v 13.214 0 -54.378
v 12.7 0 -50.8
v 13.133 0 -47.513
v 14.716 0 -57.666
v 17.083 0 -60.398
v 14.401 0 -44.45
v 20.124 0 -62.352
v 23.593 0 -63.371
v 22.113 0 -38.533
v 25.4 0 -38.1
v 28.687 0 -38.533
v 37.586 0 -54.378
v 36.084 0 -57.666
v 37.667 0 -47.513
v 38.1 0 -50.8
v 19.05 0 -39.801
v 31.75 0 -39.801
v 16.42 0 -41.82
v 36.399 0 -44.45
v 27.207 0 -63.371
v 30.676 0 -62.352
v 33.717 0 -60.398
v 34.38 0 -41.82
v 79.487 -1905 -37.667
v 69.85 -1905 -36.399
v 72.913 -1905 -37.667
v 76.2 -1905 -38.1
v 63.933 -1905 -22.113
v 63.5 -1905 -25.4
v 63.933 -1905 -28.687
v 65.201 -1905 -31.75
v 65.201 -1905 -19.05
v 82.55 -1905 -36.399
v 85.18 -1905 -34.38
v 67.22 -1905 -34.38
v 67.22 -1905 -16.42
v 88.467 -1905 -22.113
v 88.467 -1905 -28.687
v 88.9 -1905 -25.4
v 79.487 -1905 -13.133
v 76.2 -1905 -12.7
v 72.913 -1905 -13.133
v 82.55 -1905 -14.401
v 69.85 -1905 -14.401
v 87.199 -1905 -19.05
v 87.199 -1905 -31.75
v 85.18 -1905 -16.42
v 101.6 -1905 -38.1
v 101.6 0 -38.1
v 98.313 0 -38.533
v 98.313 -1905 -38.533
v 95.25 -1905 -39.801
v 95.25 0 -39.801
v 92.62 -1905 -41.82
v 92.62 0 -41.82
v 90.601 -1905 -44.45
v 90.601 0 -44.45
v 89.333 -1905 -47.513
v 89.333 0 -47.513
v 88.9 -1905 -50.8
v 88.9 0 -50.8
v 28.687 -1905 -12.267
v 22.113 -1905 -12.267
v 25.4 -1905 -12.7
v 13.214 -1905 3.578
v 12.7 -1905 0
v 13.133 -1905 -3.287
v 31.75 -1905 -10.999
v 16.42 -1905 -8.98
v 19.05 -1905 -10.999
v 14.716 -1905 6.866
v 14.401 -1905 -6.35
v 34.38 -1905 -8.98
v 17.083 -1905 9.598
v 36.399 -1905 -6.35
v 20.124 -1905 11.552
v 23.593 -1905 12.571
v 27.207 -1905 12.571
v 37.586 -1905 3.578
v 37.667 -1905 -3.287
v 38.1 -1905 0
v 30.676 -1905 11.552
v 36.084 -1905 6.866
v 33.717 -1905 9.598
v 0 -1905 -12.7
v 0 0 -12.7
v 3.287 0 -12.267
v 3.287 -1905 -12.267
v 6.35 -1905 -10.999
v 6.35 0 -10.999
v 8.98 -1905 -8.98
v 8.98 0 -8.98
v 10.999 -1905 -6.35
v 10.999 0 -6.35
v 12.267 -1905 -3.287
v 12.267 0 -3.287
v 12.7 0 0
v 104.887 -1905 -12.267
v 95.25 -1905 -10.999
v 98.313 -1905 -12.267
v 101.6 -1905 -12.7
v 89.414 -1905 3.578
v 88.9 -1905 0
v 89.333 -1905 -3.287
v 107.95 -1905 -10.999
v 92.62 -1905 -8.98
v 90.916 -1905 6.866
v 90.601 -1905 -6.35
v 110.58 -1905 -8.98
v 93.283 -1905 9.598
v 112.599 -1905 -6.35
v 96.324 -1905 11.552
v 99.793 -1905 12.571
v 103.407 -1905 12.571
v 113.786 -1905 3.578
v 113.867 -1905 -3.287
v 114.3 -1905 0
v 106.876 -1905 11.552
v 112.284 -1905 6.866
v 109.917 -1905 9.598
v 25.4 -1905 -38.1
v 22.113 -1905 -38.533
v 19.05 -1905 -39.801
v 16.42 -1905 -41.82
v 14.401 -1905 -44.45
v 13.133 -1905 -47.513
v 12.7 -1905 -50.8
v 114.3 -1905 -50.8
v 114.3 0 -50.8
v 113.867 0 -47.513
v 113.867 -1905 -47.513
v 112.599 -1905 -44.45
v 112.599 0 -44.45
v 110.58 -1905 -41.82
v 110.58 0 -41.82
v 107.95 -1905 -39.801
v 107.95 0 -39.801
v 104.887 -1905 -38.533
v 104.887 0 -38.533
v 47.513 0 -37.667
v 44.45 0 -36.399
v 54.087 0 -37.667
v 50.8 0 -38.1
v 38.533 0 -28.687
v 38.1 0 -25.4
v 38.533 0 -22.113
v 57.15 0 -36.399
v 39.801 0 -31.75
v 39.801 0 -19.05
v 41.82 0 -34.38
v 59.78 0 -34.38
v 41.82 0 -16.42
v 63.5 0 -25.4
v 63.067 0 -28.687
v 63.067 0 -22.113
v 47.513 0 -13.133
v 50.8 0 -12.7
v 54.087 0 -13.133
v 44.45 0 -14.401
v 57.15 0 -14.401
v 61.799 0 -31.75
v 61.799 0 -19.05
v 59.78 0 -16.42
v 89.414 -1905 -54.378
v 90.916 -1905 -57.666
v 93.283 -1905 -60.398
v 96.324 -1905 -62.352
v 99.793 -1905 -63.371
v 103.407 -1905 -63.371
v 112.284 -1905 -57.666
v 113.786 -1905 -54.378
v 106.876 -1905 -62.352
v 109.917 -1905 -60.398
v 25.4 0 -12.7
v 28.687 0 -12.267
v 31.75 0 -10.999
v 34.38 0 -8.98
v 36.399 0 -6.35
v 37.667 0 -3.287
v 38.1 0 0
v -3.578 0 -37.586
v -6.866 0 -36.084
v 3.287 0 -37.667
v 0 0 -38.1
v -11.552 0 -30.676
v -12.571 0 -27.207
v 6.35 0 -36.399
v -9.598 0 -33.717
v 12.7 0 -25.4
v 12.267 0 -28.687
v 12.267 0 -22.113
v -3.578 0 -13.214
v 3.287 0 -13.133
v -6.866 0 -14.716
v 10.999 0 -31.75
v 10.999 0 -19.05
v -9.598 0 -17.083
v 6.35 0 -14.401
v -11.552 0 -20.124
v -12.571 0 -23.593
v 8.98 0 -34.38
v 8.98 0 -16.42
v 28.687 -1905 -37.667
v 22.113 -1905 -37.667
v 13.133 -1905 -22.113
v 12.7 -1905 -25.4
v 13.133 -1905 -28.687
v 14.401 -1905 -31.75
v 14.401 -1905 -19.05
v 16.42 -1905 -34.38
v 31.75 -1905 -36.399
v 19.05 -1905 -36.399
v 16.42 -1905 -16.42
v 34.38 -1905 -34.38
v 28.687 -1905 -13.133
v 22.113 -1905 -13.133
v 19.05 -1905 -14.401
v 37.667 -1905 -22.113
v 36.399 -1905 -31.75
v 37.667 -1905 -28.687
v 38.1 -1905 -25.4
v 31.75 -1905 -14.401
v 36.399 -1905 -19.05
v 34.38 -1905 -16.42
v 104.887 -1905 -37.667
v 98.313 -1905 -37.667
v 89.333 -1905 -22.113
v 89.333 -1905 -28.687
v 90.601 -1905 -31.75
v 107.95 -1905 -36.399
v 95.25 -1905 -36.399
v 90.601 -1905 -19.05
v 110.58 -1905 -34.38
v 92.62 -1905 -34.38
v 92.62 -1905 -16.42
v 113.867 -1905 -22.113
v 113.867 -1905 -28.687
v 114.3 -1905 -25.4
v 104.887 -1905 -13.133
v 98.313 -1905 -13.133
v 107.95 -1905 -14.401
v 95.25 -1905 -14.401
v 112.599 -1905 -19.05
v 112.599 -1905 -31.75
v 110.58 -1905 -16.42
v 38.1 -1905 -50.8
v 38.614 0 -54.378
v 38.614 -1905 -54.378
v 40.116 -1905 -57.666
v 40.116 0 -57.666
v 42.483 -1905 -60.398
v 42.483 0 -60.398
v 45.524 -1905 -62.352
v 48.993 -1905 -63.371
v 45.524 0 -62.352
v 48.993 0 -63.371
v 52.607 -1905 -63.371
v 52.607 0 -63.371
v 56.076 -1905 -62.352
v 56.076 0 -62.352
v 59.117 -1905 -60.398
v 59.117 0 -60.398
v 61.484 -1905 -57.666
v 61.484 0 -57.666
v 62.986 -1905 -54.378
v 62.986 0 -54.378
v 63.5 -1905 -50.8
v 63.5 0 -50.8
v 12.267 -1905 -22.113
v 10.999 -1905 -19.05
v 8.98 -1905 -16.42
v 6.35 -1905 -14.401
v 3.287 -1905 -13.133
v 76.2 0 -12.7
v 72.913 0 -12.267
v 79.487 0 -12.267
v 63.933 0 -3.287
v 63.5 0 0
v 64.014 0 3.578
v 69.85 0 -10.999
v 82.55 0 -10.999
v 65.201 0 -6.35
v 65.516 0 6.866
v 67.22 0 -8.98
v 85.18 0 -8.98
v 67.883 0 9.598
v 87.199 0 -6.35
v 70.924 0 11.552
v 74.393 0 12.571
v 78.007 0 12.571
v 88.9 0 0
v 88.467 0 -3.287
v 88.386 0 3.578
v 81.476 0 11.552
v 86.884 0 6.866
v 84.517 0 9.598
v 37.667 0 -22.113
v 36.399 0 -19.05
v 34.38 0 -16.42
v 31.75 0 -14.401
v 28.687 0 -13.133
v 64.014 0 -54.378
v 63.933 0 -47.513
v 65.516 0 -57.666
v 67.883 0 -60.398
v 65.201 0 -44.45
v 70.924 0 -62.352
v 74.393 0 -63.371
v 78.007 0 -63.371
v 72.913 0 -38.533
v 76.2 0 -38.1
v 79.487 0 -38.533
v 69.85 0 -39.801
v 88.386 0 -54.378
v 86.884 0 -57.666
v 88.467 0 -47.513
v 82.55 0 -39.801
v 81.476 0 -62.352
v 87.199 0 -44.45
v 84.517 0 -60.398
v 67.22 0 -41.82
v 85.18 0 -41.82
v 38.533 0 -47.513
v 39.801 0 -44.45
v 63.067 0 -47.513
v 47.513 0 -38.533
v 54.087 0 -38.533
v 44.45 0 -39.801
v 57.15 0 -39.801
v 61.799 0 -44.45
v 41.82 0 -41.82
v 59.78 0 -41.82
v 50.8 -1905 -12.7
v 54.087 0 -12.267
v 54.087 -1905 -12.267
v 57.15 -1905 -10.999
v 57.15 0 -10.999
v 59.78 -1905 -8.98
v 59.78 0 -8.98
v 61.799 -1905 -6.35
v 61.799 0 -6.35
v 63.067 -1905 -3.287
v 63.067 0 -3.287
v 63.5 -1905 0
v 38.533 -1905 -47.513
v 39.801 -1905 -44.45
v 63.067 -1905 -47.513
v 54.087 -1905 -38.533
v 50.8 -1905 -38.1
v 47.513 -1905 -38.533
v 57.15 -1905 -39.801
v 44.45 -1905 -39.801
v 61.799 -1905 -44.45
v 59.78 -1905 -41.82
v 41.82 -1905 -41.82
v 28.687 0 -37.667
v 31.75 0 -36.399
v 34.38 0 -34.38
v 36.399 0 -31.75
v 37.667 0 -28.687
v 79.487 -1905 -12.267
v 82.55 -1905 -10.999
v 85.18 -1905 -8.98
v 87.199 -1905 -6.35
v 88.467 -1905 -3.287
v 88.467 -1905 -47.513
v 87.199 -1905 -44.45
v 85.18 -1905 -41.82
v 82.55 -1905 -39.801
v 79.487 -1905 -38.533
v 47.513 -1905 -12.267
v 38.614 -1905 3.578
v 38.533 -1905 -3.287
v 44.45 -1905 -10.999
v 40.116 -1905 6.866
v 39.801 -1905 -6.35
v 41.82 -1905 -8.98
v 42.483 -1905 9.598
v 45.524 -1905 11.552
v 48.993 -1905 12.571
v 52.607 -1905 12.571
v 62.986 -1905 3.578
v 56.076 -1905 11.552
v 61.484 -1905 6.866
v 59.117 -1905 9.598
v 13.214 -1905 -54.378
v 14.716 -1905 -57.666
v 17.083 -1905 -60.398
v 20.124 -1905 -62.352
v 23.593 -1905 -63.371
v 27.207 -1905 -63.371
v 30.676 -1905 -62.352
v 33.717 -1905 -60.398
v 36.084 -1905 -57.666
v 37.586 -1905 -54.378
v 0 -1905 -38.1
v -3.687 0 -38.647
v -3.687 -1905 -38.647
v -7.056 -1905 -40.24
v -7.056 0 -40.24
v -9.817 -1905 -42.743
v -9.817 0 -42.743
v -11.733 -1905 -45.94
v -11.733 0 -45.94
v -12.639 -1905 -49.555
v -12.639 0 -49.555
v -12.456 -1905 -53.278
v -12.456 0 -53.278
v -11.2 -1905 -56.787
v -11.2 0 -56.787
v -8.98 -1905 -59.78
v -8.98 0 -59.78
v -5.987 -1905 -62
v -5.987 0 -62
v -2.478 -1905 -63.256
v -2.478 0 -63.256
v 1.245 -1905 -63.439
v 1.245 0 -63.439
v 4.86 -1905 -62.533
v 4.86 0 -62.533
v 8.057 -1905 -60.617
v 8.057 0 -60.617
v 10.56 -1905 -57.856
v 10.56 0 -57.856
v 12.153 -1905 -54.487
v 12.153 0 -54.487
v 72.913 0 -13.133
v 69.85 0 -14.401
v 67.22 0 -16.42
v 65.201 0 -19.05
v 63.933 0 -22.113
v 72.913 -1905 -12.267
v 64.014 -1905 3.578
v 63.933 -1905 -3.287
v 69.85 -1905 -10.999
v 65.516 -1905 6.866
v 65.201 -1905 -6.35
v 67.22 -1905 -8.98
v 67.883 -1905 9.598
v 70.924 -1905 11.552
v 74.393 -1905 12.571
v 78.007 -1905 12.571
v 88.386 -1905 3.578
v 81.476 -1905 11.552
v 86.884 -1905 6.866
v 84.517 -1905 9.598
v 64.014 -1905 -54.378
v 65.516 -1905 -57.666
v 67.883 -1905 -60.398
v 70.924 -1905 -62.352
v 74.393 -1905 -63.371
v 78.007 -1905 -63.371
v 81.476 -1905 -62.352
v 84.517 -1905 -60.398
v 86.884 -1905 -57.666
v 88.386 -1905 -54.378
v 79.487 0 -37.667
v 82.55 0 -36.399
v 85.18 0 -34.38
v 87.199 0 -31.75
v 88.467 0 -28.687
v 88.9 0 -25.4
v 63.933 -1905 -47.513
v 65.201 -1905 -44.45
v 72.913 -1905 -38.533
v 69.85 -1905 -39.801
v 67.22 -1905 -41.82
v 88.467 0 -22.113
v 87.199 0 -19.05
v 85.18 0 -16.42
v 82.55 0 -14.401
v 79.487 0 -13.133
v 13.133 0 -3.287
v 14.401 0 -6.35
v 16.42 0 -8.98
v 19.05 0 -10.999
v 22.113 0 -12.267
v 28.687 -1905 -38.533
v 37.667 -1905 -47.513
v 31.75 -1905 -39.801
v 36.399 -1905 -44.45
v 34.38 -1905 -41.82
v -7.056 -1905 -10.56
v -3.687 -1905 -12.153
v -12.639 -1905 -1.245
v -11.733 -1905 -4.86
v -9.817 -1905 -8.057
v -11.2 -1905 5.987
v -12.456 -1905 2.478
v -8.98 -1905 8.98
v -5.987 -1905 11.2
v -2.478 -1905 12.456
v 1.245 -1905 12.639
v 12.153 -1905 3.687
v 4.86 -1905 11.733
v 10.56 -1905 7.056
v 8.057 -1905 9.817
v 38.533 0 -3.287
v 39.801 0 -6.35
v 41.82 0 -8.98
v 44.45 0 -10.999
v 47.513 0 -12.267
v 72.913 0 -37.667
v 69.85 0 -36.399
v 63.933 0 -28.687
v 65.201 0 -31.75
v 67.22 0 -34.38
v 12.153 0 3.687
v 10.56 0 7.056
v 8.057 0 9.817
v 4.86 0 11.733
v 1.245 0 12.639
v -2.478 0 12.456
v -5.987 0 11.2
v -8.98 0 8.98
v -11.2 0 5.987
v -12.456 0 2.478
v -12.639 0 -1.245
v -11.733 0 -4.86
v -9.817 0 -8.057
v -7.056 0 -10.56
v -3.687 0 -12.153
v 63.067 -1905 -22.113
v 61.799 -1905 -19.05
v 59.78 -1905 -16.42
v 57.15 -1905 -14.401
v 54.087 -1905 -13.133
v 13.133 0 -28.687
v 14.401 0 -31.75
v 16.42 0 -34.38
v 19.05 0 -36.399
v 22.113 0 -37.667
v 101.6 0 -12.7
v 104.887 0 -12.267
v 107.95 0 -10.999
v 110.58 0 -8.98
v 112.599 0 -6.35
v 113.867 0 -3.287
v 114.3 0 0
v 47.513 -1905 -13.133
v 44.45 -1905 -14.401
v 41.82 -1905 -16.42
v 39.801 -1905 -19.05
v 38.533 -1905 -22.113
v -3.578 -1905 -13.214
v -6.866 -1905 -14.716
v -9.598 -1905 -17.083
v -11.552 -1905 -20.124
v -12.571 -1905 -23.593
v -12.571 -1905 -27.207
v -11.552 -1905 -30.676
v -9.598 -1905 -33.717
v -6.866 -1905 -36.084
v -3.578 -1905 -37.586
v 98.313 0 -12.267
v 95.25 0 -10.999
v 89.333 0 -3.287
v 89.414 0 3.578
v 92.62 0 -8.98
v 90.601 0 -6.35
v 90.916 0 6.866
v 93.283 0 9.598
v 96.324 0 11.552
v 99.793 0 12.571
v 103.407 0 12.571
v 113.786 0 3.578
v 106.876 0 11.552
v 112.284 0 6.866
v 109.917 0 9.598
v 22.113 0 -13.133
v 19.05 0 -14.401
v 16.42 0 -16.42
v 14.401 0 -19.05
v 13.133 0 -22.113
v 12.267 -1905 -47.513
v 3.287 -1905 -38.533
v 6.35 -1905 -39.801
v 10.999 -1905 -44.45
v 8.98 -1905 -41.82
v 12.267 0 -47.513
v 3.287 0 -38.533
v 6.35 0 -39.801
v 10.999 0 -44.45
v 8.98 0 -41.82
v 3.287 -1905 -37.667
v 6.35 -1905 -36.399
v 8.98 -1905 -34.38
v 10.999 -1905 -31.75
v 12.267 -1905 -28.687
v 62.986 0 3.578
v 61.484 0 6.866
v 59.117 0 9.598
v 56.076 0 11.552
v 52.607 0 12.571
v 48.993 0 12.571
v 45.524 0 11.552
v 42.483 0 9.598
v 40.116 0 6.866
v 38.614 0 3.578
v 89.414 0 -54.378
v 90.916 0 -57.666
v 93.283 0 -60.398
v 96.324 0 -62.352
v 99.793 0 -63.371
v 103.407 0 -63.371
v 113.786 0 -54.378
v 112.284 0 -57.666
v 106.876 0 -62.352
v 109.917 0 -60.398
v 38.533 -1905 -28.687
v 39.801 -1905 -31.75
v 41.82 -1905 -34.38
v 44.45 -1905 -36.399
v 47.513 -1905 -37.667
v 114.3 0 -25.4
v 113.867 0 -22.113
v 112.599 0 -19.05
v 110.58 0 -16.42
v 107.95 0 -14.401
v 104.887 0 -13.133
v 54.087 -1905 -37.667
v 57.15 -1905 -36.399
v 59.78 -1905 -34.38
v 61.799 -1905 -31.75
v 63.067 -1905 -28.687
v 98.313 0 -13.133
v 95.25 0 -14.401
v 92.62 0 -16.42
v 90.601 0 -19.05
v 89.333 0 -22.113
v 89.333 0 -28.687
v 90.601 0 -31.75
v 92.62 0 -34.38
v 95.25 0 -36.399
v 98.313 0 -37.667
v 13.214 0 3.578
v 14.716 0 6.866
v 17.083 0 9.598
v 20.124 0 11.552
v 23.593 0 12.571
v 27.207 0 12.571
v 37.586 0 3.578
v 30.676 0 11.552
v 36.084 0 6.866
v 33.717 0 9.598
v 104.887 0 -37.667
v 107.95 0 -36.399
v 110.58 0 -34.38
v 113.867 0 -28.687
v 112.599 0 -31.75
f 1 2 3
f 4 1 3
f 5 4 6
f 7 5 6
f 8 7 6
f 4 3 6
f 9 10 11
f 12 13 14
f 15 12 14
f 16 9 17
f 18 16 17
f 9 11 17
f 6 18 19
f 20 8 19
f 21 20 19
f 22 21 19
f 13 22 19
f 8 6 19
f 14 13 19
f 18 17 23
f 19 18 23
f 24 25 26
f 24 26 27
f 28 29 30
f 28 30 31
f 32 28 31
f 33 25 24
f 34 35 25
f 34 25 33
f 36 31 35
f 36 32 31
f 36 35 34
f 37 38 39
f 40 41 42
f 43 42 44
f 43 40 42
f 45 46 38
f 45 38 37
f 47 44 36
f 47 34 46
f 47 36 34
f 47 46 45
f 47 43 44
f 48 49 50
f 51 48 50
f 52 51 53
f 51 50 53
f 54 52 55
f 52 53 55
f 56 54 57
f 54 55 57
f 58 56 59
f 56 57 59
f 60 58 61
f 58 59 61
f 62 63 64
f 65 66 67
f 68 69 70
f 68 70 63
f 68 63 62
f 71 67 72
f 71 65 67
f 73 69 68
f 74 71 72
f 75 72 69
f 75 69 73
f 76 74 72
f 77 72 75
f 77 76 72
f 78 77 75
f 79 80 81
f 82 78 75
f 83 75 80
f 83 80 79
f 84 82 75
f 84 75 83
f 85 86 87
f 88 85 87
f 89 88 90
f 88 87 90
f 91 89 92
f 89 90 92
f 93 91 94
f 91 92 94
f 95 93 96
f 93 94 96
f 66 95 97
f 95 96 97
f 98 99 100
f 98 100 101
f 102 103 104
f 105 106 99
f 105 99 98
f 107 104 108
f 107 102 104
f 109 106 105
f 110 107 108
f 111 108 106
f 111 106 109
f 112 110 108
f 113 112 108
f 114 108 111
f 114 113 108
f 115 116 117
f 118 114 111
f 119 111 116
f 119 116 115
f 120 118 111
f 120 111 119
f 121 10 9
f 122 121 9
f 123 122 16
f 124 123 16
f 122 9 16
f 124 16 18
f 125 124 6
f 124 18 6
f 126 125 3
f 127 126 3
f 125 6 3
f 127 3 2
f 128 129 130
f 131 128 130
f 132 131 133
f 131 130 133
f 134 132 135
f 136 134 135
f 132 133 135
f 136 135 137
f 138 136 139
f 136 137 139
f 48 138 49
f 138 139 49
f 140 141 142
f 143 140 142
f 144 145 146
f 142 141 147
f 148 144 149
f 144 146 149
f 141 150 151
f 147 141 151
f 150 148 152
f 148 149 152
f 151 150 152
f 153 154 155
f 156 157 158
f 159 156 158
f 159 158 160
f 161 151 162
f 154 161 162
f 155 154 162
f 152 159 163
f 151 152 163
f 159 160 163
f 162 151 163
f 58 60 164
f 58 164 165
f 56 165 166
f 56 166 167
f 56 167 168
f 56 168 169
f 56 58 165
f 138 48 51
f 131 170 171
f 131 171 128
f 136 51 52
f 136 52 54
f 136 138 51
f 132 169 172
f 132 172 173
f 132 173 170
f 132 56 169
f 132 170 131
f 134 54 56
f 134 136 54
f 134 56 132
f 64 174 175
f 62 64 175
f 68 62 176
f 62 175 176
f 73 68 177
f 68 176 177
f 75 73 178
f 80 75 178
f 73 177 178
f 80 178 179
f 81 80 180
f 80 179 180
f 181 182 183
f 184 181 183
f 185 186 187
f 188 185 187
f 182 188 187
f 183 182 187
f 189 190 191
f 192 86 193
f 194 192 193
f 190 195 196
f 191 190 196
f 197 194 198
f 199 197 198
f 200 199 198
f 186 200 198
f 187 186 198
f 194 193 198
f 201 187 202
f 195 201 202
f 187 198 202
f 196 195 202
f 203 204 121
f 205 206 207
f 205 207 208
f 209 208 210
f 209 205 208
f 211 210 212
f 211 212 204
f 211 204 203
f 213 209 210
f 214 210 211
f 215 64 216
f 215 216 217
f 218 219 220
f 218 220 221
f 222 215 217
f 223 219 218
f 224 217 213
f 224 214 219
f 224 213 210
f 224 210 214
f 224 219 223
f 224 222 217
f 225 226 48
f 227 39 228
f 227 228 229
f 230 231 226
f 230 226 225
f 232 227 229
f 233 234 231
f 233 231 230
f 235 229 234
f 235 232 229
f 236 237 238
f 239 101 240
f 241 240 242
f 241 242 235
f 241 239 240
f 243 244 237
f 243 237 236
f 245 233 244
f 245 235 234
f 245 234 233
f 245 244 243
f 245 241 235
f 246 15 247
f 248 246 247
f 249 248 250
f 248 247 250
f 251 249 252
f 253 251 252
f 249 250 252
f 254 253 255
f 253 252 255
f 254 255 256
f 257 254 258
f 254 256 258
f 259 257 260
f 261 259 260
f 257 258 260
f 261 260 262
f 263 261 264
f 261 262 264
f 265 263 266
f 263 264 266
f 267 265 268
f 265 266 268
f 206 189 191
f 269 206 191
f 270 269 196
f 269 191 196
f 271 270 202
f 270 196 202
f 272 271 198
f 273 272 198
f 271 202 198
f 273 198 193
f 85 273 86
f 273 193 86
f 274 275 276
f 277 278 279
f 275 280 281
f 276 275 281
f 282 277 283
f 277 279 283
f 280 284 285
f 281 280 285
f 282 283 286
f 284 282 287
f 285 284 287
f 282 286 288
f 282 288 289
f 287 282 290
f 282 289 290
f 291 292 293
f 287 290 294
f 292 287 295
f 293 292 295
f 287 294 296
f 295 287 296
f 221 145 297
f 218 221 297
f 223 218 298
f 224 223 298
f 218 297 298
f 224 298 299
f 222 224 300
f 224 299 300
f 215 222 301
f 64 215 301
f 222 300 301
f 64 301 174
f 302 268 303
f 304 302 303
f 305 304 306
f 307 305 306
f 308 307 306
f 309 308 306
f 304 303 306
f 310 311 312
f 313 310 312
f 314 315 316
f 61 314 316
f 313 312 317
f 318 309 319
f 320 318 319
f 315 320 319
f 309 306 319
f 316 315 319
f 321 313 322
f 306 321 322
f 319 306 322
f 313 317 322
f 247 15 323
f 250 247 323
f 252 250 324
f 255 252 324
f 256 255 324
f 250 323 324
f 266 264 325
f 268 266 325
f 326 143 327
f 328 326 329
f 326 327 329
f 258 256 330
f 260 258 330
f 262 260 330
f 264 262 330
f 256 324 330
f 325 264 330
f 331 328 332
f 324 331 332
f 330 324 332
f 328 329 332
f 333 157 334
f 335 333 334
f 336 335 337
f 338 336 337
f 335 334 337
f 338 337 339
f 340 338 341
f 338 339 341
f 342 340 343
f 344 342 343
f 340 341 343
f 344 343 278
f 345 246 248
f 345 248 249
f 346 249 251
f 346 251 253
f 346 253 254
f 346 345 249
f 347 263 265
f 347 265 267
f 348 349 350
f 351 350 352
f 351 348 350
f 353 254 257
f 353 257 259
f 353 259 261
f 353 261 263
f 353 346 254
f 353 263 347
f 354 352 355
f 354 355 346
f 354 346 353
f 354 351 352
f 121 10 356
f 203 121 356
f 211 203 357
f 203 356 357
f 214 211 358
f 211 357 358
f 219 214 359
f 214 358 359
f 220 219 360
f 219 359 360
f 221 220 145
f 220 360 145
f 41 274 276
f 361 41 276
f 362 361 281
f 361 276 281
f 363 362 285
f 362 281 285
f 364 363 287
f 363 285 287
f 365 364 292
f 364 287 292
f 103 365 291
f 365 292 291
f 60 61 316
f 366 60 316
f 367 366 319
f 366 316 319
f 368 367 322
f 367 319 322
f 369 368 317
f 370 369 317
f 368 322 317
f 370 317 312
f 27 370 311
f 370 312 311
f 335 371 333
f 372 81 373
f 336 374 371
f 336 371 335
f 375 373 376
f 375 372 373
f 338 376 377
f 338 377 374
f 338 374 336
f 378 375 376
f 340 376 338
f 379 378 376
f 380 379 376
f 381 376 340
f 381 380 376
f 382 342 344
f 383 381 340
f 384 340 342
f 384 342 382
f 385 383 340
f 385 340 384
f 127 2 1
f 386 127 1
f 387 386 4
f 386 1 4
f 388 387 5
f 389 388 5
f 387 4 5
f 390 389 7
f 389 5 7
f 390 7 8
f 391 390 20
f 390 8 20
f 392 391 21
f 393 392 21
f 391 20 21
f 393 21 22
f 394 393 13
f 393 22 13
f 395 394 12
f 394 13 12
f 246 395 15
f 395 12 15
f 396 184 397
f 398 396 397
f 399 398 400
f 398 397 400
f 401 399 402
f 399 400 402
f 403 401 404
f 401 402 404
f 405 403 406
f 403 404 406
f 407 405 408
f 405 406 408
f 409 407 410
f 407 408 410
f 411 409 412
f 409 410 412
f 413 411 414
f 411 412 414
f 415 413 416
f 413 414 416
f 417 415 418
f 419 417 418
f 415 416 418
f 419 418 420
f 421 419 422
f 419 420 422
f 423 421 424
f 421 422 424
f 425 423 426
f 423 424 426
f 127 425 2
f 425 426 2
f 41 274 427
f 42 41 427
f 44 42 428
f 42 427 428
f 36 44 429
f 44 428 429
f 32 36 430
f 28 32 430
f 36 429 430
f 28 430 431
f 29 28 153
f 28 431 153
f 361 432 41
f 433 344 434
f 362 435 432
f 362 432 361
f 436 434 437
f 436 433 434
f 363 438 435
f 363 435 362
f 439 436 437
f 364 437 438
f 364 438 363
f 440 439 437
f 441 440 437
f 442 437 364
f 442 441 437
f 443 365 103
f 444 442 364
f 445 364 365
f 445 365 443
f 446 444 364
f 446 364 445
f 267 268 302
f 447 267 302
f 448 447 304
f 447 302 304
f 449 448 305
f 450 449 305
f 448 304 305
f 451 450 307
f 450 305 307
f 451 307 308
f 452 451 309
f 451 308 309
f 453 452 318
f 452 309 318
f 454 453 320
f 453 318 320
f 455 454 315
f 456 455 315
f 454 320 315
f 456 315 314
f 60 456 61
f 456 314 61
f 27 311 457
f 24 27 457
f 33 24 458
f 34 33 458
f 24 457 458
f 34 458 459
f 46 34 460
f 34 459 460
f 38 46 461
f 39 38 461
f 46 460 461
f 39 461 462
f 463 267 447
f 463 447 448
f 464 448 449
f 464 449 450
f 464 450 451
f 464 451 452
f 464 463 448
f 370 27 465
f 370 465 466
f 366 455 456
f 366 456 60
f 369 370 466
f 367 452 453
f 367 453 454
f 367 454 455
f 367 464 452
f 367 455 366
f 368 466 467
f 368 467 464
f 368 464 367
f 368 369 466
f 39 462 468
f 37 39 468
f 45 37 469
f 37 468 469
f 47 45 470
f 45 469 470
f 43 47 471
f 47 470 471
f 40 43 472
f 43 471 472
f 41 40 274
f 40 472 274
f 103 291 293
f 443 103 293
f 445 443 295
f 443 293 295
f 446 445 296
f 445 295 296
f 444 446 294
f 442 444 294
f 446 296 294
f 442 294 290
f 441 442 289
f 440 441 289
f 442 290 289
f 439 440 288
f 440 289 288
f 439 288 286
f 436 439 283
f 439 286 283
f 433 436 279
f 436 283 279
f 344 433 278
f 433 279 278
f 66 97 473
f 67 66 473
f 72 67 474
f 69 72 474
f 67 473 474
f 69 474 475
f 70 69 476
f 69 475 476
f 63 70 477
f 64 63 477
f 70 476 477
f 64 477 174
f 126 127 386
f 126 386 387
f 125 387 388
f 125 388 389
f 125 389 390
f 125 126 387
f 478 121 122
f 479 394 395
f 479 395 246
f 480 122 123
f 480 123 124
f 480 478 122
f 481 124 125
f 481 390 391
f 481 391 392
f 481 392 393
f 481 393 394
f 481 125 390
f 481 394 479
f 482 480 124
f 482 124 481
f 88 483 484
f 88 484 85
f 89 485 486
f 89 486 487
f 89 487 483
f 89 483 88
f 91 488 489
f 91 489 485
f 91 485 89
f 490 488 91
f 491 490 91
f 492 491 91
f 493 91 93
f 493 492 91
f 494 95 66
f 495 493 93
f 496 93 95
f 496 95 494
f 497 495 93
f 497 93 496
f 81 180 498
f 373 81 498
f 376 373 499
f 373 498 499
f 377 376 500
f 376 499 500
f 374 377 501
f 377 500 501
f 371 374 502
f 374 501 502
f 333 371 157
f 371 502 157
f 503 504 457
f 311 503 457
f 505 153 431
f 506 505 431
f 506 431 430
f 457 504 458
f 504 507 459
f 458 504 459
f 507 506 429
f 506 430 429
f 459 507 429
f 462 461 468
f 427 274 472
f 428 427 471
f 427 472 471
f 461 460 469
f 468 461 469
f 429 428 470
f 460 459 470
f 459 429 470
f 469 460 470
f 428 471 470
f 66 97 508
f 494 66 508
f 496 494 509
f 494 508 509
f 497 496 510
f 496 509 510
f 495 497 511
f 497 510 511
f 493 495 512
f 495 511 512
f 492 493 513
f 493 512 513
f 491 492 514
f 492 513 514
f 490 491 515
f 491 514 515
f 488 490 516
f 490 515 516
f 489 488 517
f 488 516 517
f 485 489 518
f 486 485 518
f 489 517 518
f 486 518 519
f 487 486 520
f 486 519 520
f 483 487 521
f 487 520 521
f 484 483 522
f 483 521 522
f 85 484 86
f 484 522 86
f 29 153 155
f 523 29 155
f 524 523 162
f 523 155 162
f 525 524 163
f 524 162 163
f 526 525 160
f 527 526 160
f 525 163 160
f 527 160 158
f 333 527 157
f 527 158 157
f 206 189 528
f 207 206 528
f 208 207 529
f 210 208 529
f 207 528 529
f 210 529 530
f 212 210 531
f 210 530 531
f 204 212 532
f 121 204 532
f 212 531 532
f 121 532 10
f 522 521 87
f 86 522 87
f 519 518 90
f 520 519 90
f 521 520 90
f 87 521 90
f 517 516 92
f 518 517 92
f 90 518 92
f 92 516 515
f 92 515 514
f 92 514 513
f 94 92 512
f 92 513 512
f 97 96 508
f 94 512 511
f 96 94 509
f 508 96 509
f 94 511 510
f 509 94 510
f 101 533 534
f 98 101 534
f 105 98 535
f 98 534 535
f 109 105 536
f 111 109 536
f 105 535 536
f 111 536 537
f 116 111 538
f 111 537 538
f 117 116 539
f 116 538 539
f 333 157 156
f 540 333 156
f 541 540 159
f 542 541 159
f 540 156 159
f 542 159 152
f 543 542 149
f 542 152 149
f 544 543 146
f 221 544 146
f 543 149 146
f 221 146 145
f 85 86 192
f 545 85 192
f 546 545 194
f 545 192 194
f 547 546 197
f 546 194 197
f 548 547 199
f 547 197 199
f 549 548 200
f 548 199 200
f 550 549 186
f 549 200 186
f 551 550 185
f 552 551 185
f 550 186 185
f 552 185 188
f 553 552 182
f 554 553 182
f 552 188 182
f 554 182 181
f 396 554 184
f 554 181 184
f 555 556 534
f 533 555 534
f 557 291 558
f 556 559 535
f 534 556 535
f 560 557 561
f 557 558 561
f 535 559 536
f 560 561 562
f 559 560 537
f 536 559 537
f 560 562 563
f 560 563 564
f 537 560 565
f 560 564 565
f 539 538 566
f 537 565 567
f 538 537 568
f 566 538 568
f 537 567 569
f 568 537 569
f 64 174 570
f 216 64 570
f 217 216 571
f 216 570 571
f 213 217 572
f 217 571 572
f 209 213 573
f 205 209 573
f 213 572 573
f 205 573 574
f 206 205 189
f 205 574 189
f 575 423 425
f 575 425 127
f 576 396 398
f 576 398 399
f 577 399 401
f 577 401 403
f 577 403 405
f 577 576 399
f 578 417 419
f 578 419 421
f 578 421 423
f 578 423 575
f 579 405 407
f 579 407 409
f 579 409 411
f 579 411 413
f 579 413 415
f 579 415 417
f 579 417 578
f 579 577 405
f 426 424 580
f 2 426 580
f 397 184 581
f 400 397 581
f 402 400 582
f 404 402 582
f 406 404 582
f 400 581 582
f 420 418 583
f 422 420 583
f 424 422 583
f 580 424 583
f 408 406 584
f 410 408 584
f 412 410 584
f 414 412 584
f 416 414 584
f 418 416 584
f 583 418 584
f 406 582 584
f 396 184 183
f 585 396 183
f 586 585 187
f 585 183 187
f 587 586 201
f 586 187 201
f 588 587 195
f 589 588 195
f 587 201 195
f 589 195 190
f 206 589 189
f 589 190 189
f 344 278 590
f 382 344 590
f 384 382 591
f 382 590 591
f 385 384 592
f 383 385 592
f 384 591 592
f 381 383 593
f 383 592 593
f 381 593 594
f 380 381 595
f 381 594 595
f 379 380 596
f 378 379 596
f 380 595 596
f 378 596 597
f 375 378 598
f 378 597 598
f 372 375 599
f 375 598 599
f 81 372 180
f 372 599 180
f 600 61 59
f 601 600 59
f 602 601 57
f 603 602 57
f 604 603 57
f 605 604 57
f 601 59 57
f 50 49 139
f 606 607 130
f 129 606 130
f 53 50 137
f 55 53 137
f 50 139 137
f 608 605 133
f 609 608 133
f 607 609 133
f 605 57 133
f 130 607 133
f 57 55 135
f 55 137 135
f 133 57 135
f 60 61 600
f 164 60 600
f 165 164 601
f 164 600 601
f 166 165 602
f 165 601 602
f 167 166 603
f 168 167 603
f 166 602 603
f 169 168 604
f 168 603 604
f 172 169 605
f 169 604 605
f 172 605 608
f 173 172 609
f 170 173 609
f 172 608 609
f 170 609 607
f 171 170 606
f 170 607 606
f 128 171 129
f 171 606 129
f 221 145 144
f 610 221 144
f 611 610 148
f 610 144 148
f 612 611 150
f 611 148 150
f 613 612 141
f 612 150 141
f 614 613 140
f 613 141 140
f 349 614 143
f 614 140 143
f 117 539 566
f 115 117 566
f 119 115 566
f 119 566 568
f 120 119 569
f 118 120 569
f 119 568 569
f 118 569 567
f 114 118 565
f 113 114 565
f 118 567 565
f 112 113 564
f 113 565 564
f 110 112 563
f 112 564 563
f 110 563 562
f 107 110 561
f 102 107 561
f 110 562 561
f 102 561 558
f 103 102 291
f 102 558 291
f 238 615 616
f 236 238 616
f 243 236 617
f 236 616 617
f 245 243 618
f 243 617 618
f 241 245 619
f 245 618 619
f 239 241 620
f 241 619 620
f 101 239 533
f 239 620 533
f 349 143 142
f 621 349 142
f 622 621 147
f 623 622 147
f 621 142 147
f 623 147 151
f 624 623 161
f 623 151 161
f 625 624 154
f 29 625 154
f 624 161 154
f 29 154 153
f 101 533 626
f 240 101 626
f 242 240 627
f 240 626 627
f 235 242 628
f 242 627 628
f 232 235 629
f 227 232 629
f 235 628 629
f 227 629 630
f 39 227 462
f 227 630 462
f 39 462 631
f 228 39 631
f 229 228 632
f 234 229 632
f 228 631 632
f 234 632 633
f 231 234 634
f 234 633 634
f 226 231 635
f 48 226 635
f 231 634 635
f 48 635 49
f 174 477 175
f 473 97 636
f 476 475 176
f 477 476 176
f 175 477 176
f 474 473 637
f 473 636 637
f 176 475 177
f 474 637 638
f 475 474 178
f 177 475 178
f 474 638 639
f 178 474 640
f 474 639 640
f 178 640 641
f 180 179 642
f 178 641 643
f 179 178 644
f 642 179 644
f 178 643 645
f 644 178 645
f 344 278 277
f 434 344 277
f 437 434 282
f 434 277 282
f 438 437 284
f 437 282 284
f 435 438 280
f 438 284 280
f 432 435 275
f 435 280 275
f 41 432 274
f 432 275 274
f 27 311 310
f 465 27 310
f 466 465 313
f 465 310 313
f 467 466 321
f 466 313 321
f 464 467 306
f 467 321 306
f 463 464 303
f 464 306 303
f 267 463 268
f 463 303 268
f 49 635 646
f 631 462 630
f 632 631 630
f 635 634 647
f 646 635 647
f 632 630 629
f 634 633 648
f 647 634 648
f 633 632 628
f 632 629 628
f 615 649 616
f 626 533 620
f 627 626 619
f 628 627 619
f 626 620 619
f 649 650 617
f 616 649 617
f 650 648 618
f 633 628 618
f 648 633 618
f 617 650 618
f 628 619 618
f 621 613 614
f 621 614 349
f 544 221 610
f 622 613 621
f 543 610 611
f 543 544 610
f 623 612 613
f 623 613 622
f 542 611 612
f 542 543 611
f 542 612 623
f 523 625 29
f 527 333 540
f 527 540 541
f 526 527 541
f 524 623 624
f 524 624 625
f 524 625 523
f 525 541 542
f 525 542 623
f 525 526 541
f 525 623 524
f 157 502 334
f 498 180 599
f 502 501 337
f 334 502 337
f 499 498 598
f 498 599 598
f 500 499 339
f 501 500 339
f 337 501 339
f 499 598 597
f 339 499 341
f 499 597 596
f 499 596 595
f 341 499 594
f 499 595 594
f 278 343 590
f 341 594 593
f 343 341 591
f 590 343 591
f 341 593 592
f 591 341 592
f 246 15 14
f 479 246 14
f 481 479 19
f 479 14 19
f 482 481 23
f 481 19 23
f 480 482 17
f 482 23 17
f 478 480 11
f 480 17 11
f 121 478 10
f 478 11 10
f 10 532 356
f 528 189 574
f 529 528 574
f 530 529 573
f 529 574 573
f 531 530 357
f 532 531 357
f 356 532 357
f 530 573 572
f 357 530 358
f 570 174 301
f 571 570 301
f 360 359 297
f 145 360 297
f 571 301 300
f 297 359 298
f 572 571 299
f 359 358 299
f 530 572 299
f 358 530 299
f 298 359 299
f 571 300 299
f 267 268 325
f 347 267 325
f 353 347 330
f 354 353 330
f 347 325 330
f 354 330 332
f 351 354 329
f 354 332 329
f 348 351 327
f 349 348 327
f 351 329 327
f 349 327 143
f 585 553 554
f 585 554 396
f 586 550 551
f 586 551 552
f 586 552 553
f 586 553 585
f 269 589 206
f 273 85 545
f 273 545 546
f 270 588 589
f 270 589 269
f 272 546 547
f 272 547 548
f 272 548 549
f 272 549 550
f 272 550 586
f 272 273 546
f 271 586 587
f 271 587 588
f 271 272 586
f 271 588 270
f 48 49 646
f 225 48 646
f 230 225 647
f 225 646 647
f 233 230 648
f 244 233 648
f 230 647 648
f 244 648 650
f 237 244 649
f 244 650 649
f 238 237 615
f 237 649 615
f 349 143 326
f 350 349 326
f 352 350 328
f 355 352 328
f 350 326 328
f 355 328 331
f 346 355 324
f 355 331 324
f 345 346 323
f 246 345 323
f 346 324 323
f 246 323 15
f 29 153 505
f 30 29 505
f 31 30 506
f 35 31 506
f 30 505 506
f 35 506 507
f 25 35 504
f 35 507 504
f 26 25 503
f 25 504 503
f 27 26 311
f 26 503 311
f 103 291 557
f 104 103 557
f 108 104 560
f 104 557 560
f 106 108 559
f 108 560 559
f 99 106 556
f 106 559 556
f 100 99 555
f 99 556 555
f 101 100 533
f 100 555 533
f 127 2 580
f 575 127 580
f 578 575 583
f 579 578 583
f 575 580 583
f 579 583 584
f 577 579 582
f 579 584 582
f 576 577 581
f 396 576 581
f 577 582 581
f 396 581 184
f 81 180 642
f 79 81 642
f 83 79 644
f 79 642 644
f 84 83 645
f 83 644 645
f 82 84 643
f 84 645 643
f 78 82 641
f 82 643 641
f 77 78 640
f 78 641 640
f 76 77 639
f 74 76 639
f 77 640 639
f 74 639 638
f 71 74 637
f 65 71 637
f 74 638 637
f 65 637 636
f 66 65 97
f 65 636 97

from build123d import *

# Parameters (mm, degrees)
F1_DEPTH = 1905


with BuildPart() as f1:
    # F0 (on Front) → F1 (new body)
    with BuildSketch(Plane.XZ):
        with BuildLine():
            ThreePointArc((0, -12.7), (8.980256, -8.980256), (12.7, 0))
            ThreePointArc((12.7, 0), (-8.980256, 8.980256), (0, -12.7))
        make_face()
        with BuildLine():
            ThreePointArc((38.1, 0), (25.4, 12.7), (12.7, 0))
            ThreePointArc((12.7, 0), (16.419744, -8.980256), (25.4, -12.7))
            ThreePointArc((25.4, -12.7), (34.380256, -8.980256), (38.1, 0))
        make_face()
        with BuildLine():
            ThreePointArc((63.5, 0), (50.8, 12.7), (38.1, 0))
            ThreePointArc((38.1, 0), (41.819744, -8.980256), (50.8, -12.7))
            ThreePointArc((50.8, -12.7), (59.780256, -8.980256), (63.5, 0))
        make_face()
        with BuildLine():
            ThreePointArc((88.9, 0), (76.2, 12.7), (63.5, 0))
            ThreePointArc((63.5, 0), (67.219744, -8.980256), (76.2, -12.7))
            ThreePointArc((76.2, -12.7), (85.180256, -8.980256), (88.9, 0))
        make_face()
        with BuildLine():
            ThreePointArc((114.3, 0), (101.6, 12.7), (88.9, 0))
            ThreePointArc((88.9, 0), (92.619744, -8.980256), (101.6, -12.7))
            ThreePointArc((101.6, -12.7), (110.580256, -8.980256), (114.3, 0))
        make_face()
        with BuildLine():
            ThreePointArc((114.3, -25.4), (110.580256, -16.419744), (101.6, -12.7))
            ThreePointArc((101.6, -12.7), (92.619744, -16.419744), (88.9, -25.4))
            ThreePointArc((88.9, -25.4), (92.619744, -34.380256), (101.6, -38.1))
            ThreePointArc((101.6, -38.1), (110.580256, -34.380256), (114.3, -25.4))
        make_face()
        with BuildLine():
            ThreePointArc((88.9, -25.4), (85.180256, -16.419744), (76.2, -12.7))
            ThreePointArc((76.2, -12.7), (67.219744, -16.419744), (63.5, -25.4))
            ThreePointArc((63.5, -25.4), (67.219744, -34.380256), (76.2, -38.1))
            ThreePointArc((76.2, -38.1), (85.180256, -34.380256), (88.9, -25.4))
        make_face()
        with BuildLine():
            ThreePointArc((63.5, -25.4), (59.780256, -16.419744), (50.8, -12.7))
            ThreePointArc((50.8, -12.7), (41.819744, -16.419744), (38.1, -25.4))
            ThreePointArc((38.1, -25.4), (41.819744, -34.380256), (50.8, -38.1))
            ThreePointArc((50.8, -38.1), (59.780256, -34.380256), (63.5, -25.4))
        make_face()
        with BuildLine():
            ThreePointArc((38.1, -25.4), (34.380256, -16.419744), (25.4, -12.7))
            ThreePointArc((25.4, -12.7), (16.419744, -16.419744), (12.7, -25.4))
            ThreePointArc((12.7, -25.4), (16.419744, -34.380256), (25.4, -38.1))
            ThreePointArc((25.4, -38.1), (34.380256, -34.380256), (38.1, -25.4))
        make_face()
        with BuildLine():
            ThreePointArc((12.7, -25.4), (8.980256, -16.419744), (0, -12.7))
            ThreePointArc((0, -12.7), (-12.7, -25.4), (0, -38.1))
            ThreePointArc((0, -38.1), (8.980256, -34.380256), (12.7, -25.4))
        make_face()
        with BuildLine():
            ThreePointArc((12.7, -50.8), (8.980256, -41.819744), (0, -38.1))
            ThreePointArc((0, -38.1), (-8.980256, -59.780256), (12.7, -50.8))
        make_face()
        with BuildLine():
            ThreePointArc((38.1, -50.8), (34.380256, -41.819744), (25.4, -38.1))
            ThreePointArc((25.4, -38.1), (16.419744, -41.819744), (12.7, -50.8))
            ThreePointArc((12.7, -50.8), (25.4, -63.5), (38.1, -50.8))
        make_face()
        with BuildLine():
            ThreePointArc((63.5, -50.8), (59.780256, -41.819744), (50.8, -38.1))
            ThreePointArc((50.8, -38.1), (41.819744, -41.819744), (38.1, -50.8))
            ThreePointArc((38.1, -50.8), (50.8, -63.5), (63.5, -50.8))
        make_face()
        with BuildLine():
            ThreePointArc((88.9, -50.8), (85.180256, -41.819744), (76.2, -38.1))
            ThreePointArc((76.2, -38.1), (67.219744, -41.819744), (63.5, -50.8))
            ThreePointArc((63.5, -50.8), (76.2, -63.5), (88.9, -50.8))
        make_face()
        with BuildLine():
            ThreePointArc((114.3, -50.8), (110.580256, -41.819744), (101.6, -38.1))
            ThreePointArc((101.6, -38.1), (92.619744, -41.819744), (88.9, -50.8))
            ThreePointArc((88.9, -50.8), (101.6, -63.5), (114.3, -50.8))
        make_face()
    extrude(amount=F1_DEPTH)


solid = f1.part
